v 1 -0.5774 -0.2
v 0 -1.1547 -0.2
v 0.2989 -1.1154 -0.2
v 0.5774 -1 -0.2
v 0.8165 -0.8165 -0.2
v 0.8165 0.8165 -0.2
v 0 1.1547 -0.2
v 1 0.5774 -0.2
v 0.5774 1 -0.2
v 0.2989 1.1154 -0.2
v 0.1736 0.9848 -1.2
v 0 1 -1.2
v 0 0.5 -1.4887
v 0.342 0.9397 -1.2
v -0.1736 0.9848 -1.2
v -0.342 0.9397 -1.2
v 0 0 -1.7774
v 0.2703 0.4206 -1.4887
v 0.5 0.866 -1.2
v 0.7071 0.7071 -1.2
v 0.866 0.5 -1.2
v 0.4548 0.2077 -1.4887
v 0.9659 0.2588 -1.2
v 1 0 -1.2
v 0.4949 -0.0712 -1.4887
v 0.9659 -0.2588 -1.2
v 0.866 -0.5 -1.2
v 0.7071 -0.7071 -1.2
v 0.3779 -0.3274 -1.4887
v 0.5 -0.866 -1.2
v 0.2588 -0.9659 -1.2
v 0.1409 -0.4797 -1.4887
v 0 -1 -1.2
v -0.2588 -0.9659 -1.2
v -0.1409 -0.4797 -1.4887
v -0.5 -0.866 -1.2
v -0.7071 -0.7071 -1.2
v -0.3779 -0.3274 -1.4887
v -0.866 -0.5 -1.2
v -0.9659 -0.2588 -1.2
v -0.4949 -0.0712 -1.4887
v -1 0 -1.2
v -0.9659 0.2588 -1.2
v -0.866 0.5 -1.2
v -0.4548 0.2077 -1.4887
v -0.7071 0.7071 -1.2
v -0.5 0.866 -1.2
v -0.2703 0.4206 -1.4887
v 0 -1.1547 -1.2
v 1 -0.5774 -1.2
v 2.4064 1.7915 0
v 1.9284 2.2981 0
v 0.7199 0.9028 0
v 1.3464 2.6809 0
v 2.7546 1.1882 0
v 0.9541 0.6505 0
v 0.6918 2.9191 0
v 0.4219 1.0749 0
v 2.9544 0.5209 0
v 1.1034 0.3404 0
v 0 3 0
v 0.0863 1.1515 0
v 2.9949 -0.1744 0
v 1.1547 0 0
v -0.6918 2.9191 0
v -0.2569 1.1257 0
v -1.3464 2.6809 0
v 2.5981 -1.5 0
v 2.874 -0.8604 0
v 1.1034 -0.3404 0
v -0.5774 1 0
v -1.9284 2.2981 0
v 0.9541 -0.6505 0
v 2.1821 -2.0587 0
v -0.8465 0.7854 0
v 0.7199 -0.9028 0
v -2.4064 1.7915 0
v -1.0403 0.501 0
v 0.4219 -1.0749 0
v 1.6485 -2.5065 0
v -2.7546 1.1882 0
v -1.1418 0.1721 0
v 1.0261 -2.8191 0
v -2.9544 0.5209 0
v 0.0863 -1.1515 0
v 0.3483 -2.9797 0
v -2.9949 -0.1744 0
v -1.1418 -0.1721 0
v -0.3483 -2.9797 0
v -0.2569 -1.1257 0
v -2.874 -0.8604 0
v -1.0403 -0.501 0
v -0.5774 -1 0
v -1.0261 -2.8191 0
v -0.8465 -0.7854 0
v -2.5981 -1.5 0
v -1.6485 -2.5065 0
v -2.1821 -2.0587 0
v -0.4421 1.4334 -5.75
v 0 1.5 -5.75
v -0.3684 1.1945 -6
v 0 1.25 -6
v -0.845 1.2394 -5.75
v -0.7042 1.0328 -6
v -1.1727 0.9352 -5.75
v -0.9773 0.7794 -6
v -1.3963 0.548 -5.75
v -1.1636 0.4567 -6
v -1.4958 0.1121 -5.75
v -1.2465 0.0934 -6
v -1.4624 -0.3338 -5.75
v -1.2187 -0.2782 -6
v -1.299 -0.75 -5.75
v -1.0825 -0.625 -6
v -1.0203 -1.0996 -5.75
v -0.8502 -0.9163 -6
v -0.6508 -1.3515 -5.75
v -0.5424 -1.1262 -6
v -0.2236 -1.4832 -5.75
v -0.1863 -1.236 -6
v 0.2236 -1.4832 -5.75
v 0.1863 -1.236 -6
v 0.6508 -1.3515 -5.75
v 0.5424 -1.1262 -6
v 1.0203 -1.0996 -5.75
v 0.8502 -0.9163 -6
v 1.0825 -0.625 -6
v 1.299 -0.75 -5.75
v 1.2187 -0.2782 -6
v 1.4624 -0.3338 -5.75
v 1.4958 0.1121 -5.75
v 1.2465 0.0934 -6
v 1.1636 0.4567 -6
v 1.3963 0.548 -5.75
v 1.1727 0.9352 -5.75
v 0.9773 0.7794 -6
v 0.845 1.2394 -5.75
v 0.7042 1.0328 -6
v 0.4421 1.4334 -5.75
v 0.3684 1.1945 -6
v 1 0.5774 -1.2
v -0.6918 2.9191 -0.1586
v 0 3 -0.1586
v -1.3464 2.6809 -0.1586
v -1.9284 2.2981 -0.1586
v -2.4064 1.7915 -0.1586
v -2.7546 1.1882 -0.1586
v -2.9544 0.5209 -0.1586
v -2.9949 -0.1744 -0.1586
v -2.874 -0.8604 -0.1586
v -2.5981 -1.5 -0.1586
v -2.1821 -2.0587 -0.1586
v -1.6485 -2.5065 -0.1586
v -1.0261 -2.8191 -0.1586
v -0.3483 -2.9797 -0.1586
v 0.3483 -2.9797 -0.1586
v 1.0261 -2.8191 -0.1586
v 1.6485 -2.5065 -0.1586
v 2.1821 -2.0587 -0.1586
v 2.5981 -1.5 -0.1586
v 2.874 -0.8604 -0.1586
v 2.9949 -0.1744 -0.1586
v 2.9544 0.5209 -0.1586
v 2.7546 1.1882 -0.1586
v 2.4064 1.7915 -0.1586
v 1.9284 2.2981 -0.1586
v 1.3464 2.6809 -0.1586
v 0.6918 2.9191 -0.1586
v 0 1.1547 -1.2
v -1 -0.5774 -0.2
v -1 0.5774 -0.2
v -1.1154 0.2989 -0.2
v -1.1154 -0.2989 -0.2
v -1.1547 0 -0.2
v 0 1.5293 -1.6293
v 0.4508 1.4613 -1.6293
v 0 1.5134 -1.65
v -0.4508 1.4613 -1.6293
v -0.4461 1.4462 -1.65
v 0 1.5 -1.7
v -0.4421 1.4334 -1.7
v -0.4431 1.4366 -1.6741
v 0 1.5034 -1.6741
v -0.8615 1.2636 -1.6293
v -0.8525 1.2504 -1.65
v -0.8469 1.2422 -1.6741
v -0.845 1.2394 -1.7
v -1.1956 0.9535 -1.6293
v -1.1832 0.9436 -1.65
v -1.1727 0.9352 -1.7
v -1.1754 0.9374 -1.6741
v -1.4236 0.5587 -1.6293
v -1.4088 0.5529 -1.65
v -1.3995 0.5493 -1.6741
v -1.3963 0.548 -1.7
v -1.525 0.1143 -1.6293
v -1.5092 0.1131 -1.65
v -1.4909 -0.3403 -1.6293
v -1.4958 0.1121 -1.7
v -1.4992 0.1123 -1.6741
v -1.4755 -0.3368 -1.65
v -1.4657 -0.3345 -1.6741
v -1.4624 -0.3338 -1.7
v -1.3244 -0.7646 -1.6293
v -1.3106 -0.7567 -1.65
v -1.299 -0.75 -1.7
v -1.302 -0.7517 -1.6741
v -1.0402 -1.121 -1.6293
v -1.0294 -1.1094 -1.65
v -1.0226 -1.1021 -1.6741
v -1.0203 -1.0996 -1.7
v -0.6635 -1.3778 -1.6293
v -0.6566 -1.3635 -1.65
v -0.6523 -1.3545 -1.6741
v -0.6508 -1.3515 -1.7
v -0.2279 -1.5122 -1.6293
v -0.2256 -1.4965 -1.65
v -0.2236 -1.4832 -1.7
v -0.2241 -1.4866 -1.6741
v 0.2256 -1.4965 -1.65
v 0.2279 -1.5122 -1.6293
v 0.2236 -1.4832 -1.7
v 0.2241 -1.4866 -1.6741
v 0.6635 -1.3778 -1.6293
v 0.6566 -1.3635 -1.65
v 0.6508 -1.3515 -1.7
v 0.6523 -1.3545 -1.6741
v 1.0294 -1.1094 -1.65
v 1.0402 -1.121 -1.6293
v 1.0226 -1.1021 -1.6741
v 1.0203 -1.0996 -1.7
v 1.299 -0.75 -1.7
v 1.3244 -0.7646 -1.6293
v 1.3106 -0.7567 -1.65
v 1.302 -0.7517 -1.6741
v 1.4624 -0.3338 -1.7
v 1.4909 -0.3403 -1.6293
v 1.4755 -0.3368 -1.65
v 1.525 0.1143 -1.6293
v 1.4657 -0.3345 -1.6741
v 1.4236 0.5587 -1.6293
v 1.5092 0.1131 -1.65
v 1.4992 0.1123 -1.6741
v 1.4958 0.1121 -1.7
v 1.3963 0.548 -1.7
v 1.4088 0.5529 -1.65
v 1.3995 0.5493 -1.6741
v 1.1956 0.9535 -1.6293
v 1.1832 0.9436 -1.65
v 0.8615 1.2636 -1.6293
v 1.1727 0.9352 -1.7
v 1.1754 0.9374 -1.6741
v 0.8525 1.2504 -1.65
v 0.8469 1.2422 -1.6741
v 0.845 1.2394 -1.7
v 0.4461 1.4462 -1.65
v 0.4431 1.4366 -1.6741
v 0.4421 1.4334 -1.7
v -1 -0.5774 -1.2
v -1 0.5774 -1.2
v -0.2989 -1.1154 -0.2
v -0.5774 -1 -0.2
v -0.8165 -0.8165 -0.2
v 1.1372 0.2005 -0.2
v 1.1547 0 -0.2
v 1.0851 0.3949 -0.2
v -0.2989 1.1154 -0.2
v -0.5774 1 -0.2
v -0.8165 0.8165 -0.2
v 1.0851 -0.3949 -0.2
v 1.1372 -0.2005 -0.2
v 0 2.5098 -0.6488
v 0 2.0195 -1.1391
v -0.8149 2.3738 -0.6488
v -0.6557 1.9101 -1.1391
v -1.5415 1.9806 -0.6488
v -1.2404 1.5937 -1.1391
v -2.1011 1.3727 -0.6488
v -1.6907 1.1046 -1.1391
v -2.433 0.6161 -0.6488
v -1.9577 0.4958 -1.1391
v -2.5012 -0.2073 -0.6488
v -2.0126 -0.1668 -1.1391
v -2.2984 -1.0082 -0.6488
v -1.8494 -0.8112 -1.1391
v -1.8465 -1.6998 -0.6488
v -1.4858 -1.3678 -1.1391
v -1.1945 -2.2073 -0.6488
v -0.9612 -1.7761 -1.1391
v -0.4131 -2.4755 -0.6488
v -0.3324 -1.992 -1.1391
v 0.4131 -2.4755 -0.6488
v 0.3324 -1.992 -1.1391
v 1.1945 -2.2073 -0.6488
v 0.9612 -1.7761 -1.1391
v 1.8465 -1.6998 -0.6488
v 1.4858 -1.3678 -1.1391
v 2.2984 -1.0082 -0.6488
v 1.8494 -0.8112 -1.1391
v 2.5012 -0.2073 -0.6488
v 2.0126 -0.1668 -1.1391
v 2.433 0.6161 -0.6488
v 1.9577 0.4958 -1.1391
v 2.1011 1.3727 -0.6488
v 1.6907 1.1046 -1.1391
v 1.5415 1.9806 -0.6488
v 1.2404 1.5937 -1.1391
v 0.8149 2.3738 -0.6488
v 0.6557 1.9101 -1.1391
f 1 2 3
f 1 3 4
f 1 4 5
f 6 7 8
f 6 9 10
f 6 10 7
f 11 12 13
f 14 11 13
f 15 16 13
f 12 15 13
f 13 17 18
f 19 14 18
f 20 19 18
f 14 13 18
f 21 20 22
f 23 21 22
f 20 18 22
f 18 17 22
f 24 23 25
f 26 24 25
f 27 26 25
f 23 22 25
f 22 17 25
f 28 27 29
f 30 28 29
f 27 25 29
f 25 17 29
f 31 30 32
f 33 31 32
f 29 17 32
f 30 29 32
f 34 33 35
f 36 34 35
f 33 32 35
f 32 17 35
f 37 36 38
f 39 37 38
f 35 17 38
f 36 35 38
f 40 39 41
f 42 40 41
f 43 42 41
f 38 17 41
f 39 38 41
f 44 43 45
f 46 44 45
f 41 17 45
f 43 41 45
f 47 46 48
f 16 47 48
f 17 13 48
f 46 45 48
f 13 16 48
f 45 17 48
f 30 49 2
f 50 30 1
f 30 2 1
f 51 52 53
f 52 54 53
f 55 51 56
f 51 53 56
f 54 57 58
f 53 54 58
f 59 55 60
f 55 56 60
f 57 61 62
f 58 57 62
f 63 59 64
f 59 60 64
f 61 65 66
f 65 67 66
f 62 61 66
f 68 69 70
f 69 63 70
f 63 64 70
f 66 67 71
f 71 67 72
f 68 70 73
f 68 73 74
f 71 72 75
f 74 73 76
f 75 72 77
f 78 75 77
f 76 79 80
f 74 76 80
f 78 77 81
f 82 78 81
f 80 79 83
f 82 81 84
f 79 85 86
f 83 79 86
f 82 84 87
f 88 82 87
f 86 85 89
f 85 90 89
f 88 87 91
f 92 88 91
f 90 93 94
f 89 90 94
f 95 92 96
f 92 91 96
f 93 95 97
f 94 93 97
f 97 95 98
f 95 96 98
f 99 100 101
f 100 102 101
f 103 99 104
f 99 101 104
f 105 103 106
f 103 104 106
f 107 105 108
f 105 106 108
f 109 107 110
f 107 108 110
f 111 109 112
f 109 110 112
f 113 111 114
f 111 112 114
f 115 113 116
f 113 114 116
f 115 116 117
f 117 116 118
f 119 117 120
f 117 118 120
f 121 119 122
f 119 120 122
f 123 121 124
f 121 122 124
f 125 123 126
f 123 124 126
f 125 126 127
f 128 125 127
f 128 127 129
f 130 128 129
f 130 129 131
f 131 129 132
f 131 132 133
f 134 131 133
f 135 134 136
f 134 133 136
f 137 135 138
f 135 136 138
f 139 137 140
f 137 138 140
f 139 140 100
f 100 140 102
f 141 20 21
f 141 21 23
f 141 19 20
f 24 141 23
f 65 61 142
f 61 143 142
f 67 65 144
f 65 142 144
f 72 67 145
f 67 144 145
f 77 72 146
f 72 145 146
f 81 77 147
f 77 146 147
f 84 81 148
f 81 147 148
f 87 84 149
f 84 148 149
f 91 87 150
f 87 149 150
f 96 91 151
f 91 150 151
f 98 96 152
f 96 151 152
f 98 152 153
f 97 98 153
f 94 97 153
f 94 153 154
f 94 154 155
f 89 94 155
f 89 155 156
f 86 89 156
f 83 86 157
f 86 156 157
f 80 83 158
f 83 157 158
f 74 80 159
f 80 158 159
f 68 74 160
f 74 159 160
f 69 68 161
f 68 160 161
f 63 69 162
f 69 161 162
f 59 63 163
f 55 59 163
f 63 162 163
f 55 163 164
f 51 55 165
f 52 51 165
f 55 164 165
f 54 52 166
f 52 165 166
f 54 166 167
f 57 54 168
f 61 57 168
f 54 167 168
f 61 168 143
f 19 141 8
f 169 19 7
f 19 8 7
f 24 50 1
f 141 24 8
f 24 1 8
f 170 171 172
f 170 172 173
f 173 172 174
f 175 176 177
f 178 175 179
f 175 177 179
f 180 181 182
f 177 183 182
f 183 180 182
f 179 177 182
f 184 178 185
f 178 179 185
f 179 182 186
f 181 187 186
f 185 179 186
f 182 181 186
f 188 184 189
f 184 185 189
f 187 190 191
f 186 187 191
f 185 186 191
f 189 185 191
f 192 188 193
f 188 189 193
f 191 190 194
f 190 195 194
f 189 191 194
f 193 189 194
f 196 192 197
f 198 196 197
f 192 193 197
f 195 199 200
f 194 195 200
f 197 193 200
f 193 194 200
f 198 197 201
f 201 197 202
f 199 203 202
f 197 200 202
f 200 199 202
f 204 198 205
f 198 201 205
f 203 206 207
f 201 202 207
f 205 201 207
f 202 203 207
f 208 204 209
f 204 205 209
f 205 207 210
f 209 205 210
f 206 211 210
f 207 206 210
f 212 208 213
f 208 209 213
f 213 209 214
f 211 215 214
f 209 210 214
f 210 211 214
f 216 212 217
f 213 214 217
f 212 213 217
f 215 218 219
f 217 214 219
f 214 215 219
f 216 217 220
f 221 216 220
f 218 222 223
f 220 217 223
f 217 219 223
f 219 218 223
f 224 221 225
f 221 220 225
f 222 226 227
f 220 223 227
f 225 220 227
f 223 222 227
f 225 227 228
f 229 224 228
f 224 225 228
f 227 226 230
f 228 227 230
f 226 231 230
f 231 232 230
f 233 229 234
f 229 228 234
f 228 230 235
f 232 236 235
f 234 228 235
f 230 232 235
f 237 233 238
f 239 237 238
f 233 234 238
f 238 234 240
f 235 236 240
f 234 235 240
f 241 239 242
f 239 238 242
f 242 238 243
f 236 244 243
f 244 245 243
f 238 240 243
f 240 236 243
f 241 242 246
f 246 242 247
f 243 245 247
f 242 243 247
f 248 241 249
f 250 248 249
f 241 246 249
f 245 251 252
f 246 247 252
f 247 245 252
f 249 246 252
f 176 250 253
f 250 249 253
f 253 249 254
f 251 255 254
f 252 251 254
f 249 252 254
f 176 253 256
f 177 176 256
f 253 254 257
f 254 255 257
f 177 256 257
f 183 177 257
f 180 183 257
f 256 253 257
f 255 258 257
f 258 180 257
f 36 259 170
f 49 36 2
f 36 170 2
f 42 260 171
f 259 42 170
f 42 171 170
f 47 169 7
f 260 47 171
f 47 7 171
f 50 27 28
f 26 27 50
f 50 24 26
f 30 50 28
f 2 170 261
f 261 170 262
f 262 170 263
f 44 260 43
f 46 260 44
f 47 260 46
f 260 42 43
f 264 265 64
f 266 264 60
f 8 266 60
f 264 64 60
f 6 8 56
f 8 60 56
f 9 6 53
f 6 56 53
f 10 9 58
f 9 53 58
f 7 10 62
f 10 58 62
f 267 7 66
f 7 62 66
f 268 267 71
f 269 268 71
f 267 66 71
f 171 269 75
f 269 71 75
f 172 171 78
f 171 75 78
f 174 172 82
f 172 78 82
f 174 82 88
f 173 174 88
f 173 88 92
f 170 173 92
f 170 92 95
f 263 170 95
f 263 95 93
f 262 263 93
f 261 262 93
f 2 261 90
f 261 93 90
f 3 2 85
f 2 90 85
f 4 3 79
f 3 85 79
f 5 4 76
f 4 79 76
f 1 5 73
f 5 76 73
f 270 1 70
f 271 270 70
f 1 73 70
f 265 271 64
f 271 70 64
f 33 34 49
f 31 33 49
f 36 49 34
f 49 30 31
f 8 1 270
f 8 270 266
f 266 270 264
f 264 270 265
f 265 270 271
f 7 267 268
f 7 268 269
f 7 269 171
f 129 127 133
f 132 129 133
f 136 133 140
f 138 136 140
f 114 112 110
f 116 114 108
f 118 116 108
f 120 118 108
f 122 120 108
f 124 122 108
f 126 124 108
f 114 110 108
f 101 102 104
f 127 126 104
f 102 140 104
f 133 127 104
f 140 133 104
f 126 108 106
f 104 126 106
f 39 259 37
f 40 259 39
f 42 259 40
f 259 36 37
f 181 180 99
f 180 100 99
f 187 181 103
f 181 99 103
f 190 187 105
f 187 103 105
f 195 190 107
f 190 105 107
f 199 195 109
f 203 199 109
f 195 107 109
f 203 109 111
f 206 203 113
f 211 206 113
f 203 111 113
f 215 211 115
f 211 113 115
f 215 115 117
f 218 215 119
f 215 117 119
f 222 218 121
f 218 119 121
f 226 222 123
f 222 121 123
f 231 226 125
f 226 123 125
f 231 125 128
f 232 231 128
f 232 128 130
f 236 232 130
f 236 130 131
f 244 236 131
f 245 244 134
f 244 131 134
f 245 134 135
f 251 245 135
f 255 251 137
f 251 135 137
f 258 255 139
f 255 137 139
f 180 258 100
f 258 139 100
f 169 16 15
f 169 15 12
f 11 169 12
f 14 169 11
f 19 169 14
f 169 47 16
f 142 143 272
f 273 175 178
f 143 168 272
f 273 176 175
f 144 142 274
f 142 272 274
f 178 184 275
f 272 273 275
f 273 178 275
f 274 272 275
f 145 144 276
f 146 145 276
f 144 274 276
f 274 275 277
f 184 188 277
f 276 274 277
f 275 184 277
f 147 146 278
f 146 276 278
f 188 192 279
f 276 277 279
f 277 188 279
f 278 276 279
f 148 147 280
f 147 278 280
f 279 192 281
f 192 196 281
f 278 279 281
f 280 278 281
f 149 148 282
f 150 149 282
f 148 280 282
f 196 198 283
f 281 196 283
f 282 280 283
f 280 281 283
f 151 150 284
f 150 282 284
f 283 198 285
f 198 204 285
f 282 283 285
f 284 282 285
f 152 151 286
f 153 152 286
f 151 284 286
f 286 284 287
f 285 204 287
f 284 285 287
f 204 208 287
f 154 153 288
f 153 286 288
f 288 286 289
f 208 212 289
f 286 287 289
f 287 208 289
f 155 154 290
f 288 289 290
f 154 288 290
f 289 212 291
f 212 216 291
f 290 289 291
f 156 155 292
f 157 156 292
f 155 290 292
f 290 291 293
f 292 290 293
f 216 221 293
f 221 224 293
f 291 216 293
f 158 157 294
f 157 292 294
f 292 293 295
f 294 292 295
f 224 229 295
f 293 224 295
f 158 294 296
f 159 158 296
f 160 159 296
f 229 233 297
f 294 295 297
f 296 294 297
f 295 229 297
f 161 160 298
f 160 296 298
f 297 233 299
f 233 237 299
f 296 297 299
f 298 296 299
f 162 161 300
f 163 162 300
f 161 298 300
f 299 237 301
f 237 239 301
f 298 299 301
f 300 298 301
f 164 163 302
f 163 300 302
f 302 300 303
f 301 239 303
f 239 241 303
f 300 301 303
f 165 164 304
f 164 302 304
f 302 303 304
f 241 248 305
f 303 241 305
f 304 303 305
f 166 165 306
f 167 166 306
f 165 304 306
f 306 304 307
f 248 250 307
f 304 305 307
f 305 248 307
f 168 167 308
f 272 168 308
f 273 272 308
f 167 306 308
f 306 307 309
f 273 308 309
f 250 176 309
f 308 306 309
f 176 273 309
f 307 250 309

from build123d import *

# Parameters (mm, degrees)
CUT_EXTRUDE1_DEPTH = 1.2
SKETCH5_R          = 1.154700538
CUT_EXTRUDE2_DEPTH = 0.2


with BuildPart() as part:
    # Sketch2 → Revolve1 (revolve)
    with BuildSketch(Plane(origin=(0, 0, 0), x_dir=(0, 0, -1), z_dir=(1, 0, 0))):
        with BuildLine():
            Line((0, 0), (0, 3))
            Line((0, 3), (0.158578644, 3))
            Line((0.158578644, 3), (1.629289322, 1.529289322))
            ThreePointArc((1.629289322, 1.529289322), (1.661731657, 1.507612047), (1.7, 1.5))
            Line((1.7, 1.5), (5.75, 1.5))
            Line((5.75, 1.5), (6, 1.25))
            Line((6, 1.25), (6, 0))
            Line((6, 0), (0, 0))
        make_face()
    revolve(axis=Axis((0, 0, 0), (0, 0, 1)))

    # Sketch3 → Cut-Extrude1 (cut)
    with BuildSketch(Plane.XY):
        Polygon((0, 1.154700538), (-1, 0.577350269), (-1, -0.577350269), (0, -1.154700538), (1, -0.577350269), (1, 0.577350269), align=None)
    extrude(amount=-CUT_EXTRUDE1_DEPTH, mode=Mode.SUBTRACT)

    # Sketch4 → Cut-Revolve1 (revolve, cut)
    with BuildSketch(Plane(origin=(0, 0, 0), x_dir=(0, 0, -1), z_dir=(1, 0, 0))):
        Polygon((1.2, 0), (1.2, 1), (1.777350269, 0), align=None)
    revolve(axis=Axis((0, 0, 0), (0, 0, -1)), mode=Mode.SUBTRACT)

    # Sketch5 → Cut-Extrude2 (cut)
    with BuildSketch(Plane.XY):
        Circle(SKETCH5_R)
    extrude(amount=-CUT_EXTRUDE2_DEPTH, mode=Mode.SUBTRACT)


solid = part.part
